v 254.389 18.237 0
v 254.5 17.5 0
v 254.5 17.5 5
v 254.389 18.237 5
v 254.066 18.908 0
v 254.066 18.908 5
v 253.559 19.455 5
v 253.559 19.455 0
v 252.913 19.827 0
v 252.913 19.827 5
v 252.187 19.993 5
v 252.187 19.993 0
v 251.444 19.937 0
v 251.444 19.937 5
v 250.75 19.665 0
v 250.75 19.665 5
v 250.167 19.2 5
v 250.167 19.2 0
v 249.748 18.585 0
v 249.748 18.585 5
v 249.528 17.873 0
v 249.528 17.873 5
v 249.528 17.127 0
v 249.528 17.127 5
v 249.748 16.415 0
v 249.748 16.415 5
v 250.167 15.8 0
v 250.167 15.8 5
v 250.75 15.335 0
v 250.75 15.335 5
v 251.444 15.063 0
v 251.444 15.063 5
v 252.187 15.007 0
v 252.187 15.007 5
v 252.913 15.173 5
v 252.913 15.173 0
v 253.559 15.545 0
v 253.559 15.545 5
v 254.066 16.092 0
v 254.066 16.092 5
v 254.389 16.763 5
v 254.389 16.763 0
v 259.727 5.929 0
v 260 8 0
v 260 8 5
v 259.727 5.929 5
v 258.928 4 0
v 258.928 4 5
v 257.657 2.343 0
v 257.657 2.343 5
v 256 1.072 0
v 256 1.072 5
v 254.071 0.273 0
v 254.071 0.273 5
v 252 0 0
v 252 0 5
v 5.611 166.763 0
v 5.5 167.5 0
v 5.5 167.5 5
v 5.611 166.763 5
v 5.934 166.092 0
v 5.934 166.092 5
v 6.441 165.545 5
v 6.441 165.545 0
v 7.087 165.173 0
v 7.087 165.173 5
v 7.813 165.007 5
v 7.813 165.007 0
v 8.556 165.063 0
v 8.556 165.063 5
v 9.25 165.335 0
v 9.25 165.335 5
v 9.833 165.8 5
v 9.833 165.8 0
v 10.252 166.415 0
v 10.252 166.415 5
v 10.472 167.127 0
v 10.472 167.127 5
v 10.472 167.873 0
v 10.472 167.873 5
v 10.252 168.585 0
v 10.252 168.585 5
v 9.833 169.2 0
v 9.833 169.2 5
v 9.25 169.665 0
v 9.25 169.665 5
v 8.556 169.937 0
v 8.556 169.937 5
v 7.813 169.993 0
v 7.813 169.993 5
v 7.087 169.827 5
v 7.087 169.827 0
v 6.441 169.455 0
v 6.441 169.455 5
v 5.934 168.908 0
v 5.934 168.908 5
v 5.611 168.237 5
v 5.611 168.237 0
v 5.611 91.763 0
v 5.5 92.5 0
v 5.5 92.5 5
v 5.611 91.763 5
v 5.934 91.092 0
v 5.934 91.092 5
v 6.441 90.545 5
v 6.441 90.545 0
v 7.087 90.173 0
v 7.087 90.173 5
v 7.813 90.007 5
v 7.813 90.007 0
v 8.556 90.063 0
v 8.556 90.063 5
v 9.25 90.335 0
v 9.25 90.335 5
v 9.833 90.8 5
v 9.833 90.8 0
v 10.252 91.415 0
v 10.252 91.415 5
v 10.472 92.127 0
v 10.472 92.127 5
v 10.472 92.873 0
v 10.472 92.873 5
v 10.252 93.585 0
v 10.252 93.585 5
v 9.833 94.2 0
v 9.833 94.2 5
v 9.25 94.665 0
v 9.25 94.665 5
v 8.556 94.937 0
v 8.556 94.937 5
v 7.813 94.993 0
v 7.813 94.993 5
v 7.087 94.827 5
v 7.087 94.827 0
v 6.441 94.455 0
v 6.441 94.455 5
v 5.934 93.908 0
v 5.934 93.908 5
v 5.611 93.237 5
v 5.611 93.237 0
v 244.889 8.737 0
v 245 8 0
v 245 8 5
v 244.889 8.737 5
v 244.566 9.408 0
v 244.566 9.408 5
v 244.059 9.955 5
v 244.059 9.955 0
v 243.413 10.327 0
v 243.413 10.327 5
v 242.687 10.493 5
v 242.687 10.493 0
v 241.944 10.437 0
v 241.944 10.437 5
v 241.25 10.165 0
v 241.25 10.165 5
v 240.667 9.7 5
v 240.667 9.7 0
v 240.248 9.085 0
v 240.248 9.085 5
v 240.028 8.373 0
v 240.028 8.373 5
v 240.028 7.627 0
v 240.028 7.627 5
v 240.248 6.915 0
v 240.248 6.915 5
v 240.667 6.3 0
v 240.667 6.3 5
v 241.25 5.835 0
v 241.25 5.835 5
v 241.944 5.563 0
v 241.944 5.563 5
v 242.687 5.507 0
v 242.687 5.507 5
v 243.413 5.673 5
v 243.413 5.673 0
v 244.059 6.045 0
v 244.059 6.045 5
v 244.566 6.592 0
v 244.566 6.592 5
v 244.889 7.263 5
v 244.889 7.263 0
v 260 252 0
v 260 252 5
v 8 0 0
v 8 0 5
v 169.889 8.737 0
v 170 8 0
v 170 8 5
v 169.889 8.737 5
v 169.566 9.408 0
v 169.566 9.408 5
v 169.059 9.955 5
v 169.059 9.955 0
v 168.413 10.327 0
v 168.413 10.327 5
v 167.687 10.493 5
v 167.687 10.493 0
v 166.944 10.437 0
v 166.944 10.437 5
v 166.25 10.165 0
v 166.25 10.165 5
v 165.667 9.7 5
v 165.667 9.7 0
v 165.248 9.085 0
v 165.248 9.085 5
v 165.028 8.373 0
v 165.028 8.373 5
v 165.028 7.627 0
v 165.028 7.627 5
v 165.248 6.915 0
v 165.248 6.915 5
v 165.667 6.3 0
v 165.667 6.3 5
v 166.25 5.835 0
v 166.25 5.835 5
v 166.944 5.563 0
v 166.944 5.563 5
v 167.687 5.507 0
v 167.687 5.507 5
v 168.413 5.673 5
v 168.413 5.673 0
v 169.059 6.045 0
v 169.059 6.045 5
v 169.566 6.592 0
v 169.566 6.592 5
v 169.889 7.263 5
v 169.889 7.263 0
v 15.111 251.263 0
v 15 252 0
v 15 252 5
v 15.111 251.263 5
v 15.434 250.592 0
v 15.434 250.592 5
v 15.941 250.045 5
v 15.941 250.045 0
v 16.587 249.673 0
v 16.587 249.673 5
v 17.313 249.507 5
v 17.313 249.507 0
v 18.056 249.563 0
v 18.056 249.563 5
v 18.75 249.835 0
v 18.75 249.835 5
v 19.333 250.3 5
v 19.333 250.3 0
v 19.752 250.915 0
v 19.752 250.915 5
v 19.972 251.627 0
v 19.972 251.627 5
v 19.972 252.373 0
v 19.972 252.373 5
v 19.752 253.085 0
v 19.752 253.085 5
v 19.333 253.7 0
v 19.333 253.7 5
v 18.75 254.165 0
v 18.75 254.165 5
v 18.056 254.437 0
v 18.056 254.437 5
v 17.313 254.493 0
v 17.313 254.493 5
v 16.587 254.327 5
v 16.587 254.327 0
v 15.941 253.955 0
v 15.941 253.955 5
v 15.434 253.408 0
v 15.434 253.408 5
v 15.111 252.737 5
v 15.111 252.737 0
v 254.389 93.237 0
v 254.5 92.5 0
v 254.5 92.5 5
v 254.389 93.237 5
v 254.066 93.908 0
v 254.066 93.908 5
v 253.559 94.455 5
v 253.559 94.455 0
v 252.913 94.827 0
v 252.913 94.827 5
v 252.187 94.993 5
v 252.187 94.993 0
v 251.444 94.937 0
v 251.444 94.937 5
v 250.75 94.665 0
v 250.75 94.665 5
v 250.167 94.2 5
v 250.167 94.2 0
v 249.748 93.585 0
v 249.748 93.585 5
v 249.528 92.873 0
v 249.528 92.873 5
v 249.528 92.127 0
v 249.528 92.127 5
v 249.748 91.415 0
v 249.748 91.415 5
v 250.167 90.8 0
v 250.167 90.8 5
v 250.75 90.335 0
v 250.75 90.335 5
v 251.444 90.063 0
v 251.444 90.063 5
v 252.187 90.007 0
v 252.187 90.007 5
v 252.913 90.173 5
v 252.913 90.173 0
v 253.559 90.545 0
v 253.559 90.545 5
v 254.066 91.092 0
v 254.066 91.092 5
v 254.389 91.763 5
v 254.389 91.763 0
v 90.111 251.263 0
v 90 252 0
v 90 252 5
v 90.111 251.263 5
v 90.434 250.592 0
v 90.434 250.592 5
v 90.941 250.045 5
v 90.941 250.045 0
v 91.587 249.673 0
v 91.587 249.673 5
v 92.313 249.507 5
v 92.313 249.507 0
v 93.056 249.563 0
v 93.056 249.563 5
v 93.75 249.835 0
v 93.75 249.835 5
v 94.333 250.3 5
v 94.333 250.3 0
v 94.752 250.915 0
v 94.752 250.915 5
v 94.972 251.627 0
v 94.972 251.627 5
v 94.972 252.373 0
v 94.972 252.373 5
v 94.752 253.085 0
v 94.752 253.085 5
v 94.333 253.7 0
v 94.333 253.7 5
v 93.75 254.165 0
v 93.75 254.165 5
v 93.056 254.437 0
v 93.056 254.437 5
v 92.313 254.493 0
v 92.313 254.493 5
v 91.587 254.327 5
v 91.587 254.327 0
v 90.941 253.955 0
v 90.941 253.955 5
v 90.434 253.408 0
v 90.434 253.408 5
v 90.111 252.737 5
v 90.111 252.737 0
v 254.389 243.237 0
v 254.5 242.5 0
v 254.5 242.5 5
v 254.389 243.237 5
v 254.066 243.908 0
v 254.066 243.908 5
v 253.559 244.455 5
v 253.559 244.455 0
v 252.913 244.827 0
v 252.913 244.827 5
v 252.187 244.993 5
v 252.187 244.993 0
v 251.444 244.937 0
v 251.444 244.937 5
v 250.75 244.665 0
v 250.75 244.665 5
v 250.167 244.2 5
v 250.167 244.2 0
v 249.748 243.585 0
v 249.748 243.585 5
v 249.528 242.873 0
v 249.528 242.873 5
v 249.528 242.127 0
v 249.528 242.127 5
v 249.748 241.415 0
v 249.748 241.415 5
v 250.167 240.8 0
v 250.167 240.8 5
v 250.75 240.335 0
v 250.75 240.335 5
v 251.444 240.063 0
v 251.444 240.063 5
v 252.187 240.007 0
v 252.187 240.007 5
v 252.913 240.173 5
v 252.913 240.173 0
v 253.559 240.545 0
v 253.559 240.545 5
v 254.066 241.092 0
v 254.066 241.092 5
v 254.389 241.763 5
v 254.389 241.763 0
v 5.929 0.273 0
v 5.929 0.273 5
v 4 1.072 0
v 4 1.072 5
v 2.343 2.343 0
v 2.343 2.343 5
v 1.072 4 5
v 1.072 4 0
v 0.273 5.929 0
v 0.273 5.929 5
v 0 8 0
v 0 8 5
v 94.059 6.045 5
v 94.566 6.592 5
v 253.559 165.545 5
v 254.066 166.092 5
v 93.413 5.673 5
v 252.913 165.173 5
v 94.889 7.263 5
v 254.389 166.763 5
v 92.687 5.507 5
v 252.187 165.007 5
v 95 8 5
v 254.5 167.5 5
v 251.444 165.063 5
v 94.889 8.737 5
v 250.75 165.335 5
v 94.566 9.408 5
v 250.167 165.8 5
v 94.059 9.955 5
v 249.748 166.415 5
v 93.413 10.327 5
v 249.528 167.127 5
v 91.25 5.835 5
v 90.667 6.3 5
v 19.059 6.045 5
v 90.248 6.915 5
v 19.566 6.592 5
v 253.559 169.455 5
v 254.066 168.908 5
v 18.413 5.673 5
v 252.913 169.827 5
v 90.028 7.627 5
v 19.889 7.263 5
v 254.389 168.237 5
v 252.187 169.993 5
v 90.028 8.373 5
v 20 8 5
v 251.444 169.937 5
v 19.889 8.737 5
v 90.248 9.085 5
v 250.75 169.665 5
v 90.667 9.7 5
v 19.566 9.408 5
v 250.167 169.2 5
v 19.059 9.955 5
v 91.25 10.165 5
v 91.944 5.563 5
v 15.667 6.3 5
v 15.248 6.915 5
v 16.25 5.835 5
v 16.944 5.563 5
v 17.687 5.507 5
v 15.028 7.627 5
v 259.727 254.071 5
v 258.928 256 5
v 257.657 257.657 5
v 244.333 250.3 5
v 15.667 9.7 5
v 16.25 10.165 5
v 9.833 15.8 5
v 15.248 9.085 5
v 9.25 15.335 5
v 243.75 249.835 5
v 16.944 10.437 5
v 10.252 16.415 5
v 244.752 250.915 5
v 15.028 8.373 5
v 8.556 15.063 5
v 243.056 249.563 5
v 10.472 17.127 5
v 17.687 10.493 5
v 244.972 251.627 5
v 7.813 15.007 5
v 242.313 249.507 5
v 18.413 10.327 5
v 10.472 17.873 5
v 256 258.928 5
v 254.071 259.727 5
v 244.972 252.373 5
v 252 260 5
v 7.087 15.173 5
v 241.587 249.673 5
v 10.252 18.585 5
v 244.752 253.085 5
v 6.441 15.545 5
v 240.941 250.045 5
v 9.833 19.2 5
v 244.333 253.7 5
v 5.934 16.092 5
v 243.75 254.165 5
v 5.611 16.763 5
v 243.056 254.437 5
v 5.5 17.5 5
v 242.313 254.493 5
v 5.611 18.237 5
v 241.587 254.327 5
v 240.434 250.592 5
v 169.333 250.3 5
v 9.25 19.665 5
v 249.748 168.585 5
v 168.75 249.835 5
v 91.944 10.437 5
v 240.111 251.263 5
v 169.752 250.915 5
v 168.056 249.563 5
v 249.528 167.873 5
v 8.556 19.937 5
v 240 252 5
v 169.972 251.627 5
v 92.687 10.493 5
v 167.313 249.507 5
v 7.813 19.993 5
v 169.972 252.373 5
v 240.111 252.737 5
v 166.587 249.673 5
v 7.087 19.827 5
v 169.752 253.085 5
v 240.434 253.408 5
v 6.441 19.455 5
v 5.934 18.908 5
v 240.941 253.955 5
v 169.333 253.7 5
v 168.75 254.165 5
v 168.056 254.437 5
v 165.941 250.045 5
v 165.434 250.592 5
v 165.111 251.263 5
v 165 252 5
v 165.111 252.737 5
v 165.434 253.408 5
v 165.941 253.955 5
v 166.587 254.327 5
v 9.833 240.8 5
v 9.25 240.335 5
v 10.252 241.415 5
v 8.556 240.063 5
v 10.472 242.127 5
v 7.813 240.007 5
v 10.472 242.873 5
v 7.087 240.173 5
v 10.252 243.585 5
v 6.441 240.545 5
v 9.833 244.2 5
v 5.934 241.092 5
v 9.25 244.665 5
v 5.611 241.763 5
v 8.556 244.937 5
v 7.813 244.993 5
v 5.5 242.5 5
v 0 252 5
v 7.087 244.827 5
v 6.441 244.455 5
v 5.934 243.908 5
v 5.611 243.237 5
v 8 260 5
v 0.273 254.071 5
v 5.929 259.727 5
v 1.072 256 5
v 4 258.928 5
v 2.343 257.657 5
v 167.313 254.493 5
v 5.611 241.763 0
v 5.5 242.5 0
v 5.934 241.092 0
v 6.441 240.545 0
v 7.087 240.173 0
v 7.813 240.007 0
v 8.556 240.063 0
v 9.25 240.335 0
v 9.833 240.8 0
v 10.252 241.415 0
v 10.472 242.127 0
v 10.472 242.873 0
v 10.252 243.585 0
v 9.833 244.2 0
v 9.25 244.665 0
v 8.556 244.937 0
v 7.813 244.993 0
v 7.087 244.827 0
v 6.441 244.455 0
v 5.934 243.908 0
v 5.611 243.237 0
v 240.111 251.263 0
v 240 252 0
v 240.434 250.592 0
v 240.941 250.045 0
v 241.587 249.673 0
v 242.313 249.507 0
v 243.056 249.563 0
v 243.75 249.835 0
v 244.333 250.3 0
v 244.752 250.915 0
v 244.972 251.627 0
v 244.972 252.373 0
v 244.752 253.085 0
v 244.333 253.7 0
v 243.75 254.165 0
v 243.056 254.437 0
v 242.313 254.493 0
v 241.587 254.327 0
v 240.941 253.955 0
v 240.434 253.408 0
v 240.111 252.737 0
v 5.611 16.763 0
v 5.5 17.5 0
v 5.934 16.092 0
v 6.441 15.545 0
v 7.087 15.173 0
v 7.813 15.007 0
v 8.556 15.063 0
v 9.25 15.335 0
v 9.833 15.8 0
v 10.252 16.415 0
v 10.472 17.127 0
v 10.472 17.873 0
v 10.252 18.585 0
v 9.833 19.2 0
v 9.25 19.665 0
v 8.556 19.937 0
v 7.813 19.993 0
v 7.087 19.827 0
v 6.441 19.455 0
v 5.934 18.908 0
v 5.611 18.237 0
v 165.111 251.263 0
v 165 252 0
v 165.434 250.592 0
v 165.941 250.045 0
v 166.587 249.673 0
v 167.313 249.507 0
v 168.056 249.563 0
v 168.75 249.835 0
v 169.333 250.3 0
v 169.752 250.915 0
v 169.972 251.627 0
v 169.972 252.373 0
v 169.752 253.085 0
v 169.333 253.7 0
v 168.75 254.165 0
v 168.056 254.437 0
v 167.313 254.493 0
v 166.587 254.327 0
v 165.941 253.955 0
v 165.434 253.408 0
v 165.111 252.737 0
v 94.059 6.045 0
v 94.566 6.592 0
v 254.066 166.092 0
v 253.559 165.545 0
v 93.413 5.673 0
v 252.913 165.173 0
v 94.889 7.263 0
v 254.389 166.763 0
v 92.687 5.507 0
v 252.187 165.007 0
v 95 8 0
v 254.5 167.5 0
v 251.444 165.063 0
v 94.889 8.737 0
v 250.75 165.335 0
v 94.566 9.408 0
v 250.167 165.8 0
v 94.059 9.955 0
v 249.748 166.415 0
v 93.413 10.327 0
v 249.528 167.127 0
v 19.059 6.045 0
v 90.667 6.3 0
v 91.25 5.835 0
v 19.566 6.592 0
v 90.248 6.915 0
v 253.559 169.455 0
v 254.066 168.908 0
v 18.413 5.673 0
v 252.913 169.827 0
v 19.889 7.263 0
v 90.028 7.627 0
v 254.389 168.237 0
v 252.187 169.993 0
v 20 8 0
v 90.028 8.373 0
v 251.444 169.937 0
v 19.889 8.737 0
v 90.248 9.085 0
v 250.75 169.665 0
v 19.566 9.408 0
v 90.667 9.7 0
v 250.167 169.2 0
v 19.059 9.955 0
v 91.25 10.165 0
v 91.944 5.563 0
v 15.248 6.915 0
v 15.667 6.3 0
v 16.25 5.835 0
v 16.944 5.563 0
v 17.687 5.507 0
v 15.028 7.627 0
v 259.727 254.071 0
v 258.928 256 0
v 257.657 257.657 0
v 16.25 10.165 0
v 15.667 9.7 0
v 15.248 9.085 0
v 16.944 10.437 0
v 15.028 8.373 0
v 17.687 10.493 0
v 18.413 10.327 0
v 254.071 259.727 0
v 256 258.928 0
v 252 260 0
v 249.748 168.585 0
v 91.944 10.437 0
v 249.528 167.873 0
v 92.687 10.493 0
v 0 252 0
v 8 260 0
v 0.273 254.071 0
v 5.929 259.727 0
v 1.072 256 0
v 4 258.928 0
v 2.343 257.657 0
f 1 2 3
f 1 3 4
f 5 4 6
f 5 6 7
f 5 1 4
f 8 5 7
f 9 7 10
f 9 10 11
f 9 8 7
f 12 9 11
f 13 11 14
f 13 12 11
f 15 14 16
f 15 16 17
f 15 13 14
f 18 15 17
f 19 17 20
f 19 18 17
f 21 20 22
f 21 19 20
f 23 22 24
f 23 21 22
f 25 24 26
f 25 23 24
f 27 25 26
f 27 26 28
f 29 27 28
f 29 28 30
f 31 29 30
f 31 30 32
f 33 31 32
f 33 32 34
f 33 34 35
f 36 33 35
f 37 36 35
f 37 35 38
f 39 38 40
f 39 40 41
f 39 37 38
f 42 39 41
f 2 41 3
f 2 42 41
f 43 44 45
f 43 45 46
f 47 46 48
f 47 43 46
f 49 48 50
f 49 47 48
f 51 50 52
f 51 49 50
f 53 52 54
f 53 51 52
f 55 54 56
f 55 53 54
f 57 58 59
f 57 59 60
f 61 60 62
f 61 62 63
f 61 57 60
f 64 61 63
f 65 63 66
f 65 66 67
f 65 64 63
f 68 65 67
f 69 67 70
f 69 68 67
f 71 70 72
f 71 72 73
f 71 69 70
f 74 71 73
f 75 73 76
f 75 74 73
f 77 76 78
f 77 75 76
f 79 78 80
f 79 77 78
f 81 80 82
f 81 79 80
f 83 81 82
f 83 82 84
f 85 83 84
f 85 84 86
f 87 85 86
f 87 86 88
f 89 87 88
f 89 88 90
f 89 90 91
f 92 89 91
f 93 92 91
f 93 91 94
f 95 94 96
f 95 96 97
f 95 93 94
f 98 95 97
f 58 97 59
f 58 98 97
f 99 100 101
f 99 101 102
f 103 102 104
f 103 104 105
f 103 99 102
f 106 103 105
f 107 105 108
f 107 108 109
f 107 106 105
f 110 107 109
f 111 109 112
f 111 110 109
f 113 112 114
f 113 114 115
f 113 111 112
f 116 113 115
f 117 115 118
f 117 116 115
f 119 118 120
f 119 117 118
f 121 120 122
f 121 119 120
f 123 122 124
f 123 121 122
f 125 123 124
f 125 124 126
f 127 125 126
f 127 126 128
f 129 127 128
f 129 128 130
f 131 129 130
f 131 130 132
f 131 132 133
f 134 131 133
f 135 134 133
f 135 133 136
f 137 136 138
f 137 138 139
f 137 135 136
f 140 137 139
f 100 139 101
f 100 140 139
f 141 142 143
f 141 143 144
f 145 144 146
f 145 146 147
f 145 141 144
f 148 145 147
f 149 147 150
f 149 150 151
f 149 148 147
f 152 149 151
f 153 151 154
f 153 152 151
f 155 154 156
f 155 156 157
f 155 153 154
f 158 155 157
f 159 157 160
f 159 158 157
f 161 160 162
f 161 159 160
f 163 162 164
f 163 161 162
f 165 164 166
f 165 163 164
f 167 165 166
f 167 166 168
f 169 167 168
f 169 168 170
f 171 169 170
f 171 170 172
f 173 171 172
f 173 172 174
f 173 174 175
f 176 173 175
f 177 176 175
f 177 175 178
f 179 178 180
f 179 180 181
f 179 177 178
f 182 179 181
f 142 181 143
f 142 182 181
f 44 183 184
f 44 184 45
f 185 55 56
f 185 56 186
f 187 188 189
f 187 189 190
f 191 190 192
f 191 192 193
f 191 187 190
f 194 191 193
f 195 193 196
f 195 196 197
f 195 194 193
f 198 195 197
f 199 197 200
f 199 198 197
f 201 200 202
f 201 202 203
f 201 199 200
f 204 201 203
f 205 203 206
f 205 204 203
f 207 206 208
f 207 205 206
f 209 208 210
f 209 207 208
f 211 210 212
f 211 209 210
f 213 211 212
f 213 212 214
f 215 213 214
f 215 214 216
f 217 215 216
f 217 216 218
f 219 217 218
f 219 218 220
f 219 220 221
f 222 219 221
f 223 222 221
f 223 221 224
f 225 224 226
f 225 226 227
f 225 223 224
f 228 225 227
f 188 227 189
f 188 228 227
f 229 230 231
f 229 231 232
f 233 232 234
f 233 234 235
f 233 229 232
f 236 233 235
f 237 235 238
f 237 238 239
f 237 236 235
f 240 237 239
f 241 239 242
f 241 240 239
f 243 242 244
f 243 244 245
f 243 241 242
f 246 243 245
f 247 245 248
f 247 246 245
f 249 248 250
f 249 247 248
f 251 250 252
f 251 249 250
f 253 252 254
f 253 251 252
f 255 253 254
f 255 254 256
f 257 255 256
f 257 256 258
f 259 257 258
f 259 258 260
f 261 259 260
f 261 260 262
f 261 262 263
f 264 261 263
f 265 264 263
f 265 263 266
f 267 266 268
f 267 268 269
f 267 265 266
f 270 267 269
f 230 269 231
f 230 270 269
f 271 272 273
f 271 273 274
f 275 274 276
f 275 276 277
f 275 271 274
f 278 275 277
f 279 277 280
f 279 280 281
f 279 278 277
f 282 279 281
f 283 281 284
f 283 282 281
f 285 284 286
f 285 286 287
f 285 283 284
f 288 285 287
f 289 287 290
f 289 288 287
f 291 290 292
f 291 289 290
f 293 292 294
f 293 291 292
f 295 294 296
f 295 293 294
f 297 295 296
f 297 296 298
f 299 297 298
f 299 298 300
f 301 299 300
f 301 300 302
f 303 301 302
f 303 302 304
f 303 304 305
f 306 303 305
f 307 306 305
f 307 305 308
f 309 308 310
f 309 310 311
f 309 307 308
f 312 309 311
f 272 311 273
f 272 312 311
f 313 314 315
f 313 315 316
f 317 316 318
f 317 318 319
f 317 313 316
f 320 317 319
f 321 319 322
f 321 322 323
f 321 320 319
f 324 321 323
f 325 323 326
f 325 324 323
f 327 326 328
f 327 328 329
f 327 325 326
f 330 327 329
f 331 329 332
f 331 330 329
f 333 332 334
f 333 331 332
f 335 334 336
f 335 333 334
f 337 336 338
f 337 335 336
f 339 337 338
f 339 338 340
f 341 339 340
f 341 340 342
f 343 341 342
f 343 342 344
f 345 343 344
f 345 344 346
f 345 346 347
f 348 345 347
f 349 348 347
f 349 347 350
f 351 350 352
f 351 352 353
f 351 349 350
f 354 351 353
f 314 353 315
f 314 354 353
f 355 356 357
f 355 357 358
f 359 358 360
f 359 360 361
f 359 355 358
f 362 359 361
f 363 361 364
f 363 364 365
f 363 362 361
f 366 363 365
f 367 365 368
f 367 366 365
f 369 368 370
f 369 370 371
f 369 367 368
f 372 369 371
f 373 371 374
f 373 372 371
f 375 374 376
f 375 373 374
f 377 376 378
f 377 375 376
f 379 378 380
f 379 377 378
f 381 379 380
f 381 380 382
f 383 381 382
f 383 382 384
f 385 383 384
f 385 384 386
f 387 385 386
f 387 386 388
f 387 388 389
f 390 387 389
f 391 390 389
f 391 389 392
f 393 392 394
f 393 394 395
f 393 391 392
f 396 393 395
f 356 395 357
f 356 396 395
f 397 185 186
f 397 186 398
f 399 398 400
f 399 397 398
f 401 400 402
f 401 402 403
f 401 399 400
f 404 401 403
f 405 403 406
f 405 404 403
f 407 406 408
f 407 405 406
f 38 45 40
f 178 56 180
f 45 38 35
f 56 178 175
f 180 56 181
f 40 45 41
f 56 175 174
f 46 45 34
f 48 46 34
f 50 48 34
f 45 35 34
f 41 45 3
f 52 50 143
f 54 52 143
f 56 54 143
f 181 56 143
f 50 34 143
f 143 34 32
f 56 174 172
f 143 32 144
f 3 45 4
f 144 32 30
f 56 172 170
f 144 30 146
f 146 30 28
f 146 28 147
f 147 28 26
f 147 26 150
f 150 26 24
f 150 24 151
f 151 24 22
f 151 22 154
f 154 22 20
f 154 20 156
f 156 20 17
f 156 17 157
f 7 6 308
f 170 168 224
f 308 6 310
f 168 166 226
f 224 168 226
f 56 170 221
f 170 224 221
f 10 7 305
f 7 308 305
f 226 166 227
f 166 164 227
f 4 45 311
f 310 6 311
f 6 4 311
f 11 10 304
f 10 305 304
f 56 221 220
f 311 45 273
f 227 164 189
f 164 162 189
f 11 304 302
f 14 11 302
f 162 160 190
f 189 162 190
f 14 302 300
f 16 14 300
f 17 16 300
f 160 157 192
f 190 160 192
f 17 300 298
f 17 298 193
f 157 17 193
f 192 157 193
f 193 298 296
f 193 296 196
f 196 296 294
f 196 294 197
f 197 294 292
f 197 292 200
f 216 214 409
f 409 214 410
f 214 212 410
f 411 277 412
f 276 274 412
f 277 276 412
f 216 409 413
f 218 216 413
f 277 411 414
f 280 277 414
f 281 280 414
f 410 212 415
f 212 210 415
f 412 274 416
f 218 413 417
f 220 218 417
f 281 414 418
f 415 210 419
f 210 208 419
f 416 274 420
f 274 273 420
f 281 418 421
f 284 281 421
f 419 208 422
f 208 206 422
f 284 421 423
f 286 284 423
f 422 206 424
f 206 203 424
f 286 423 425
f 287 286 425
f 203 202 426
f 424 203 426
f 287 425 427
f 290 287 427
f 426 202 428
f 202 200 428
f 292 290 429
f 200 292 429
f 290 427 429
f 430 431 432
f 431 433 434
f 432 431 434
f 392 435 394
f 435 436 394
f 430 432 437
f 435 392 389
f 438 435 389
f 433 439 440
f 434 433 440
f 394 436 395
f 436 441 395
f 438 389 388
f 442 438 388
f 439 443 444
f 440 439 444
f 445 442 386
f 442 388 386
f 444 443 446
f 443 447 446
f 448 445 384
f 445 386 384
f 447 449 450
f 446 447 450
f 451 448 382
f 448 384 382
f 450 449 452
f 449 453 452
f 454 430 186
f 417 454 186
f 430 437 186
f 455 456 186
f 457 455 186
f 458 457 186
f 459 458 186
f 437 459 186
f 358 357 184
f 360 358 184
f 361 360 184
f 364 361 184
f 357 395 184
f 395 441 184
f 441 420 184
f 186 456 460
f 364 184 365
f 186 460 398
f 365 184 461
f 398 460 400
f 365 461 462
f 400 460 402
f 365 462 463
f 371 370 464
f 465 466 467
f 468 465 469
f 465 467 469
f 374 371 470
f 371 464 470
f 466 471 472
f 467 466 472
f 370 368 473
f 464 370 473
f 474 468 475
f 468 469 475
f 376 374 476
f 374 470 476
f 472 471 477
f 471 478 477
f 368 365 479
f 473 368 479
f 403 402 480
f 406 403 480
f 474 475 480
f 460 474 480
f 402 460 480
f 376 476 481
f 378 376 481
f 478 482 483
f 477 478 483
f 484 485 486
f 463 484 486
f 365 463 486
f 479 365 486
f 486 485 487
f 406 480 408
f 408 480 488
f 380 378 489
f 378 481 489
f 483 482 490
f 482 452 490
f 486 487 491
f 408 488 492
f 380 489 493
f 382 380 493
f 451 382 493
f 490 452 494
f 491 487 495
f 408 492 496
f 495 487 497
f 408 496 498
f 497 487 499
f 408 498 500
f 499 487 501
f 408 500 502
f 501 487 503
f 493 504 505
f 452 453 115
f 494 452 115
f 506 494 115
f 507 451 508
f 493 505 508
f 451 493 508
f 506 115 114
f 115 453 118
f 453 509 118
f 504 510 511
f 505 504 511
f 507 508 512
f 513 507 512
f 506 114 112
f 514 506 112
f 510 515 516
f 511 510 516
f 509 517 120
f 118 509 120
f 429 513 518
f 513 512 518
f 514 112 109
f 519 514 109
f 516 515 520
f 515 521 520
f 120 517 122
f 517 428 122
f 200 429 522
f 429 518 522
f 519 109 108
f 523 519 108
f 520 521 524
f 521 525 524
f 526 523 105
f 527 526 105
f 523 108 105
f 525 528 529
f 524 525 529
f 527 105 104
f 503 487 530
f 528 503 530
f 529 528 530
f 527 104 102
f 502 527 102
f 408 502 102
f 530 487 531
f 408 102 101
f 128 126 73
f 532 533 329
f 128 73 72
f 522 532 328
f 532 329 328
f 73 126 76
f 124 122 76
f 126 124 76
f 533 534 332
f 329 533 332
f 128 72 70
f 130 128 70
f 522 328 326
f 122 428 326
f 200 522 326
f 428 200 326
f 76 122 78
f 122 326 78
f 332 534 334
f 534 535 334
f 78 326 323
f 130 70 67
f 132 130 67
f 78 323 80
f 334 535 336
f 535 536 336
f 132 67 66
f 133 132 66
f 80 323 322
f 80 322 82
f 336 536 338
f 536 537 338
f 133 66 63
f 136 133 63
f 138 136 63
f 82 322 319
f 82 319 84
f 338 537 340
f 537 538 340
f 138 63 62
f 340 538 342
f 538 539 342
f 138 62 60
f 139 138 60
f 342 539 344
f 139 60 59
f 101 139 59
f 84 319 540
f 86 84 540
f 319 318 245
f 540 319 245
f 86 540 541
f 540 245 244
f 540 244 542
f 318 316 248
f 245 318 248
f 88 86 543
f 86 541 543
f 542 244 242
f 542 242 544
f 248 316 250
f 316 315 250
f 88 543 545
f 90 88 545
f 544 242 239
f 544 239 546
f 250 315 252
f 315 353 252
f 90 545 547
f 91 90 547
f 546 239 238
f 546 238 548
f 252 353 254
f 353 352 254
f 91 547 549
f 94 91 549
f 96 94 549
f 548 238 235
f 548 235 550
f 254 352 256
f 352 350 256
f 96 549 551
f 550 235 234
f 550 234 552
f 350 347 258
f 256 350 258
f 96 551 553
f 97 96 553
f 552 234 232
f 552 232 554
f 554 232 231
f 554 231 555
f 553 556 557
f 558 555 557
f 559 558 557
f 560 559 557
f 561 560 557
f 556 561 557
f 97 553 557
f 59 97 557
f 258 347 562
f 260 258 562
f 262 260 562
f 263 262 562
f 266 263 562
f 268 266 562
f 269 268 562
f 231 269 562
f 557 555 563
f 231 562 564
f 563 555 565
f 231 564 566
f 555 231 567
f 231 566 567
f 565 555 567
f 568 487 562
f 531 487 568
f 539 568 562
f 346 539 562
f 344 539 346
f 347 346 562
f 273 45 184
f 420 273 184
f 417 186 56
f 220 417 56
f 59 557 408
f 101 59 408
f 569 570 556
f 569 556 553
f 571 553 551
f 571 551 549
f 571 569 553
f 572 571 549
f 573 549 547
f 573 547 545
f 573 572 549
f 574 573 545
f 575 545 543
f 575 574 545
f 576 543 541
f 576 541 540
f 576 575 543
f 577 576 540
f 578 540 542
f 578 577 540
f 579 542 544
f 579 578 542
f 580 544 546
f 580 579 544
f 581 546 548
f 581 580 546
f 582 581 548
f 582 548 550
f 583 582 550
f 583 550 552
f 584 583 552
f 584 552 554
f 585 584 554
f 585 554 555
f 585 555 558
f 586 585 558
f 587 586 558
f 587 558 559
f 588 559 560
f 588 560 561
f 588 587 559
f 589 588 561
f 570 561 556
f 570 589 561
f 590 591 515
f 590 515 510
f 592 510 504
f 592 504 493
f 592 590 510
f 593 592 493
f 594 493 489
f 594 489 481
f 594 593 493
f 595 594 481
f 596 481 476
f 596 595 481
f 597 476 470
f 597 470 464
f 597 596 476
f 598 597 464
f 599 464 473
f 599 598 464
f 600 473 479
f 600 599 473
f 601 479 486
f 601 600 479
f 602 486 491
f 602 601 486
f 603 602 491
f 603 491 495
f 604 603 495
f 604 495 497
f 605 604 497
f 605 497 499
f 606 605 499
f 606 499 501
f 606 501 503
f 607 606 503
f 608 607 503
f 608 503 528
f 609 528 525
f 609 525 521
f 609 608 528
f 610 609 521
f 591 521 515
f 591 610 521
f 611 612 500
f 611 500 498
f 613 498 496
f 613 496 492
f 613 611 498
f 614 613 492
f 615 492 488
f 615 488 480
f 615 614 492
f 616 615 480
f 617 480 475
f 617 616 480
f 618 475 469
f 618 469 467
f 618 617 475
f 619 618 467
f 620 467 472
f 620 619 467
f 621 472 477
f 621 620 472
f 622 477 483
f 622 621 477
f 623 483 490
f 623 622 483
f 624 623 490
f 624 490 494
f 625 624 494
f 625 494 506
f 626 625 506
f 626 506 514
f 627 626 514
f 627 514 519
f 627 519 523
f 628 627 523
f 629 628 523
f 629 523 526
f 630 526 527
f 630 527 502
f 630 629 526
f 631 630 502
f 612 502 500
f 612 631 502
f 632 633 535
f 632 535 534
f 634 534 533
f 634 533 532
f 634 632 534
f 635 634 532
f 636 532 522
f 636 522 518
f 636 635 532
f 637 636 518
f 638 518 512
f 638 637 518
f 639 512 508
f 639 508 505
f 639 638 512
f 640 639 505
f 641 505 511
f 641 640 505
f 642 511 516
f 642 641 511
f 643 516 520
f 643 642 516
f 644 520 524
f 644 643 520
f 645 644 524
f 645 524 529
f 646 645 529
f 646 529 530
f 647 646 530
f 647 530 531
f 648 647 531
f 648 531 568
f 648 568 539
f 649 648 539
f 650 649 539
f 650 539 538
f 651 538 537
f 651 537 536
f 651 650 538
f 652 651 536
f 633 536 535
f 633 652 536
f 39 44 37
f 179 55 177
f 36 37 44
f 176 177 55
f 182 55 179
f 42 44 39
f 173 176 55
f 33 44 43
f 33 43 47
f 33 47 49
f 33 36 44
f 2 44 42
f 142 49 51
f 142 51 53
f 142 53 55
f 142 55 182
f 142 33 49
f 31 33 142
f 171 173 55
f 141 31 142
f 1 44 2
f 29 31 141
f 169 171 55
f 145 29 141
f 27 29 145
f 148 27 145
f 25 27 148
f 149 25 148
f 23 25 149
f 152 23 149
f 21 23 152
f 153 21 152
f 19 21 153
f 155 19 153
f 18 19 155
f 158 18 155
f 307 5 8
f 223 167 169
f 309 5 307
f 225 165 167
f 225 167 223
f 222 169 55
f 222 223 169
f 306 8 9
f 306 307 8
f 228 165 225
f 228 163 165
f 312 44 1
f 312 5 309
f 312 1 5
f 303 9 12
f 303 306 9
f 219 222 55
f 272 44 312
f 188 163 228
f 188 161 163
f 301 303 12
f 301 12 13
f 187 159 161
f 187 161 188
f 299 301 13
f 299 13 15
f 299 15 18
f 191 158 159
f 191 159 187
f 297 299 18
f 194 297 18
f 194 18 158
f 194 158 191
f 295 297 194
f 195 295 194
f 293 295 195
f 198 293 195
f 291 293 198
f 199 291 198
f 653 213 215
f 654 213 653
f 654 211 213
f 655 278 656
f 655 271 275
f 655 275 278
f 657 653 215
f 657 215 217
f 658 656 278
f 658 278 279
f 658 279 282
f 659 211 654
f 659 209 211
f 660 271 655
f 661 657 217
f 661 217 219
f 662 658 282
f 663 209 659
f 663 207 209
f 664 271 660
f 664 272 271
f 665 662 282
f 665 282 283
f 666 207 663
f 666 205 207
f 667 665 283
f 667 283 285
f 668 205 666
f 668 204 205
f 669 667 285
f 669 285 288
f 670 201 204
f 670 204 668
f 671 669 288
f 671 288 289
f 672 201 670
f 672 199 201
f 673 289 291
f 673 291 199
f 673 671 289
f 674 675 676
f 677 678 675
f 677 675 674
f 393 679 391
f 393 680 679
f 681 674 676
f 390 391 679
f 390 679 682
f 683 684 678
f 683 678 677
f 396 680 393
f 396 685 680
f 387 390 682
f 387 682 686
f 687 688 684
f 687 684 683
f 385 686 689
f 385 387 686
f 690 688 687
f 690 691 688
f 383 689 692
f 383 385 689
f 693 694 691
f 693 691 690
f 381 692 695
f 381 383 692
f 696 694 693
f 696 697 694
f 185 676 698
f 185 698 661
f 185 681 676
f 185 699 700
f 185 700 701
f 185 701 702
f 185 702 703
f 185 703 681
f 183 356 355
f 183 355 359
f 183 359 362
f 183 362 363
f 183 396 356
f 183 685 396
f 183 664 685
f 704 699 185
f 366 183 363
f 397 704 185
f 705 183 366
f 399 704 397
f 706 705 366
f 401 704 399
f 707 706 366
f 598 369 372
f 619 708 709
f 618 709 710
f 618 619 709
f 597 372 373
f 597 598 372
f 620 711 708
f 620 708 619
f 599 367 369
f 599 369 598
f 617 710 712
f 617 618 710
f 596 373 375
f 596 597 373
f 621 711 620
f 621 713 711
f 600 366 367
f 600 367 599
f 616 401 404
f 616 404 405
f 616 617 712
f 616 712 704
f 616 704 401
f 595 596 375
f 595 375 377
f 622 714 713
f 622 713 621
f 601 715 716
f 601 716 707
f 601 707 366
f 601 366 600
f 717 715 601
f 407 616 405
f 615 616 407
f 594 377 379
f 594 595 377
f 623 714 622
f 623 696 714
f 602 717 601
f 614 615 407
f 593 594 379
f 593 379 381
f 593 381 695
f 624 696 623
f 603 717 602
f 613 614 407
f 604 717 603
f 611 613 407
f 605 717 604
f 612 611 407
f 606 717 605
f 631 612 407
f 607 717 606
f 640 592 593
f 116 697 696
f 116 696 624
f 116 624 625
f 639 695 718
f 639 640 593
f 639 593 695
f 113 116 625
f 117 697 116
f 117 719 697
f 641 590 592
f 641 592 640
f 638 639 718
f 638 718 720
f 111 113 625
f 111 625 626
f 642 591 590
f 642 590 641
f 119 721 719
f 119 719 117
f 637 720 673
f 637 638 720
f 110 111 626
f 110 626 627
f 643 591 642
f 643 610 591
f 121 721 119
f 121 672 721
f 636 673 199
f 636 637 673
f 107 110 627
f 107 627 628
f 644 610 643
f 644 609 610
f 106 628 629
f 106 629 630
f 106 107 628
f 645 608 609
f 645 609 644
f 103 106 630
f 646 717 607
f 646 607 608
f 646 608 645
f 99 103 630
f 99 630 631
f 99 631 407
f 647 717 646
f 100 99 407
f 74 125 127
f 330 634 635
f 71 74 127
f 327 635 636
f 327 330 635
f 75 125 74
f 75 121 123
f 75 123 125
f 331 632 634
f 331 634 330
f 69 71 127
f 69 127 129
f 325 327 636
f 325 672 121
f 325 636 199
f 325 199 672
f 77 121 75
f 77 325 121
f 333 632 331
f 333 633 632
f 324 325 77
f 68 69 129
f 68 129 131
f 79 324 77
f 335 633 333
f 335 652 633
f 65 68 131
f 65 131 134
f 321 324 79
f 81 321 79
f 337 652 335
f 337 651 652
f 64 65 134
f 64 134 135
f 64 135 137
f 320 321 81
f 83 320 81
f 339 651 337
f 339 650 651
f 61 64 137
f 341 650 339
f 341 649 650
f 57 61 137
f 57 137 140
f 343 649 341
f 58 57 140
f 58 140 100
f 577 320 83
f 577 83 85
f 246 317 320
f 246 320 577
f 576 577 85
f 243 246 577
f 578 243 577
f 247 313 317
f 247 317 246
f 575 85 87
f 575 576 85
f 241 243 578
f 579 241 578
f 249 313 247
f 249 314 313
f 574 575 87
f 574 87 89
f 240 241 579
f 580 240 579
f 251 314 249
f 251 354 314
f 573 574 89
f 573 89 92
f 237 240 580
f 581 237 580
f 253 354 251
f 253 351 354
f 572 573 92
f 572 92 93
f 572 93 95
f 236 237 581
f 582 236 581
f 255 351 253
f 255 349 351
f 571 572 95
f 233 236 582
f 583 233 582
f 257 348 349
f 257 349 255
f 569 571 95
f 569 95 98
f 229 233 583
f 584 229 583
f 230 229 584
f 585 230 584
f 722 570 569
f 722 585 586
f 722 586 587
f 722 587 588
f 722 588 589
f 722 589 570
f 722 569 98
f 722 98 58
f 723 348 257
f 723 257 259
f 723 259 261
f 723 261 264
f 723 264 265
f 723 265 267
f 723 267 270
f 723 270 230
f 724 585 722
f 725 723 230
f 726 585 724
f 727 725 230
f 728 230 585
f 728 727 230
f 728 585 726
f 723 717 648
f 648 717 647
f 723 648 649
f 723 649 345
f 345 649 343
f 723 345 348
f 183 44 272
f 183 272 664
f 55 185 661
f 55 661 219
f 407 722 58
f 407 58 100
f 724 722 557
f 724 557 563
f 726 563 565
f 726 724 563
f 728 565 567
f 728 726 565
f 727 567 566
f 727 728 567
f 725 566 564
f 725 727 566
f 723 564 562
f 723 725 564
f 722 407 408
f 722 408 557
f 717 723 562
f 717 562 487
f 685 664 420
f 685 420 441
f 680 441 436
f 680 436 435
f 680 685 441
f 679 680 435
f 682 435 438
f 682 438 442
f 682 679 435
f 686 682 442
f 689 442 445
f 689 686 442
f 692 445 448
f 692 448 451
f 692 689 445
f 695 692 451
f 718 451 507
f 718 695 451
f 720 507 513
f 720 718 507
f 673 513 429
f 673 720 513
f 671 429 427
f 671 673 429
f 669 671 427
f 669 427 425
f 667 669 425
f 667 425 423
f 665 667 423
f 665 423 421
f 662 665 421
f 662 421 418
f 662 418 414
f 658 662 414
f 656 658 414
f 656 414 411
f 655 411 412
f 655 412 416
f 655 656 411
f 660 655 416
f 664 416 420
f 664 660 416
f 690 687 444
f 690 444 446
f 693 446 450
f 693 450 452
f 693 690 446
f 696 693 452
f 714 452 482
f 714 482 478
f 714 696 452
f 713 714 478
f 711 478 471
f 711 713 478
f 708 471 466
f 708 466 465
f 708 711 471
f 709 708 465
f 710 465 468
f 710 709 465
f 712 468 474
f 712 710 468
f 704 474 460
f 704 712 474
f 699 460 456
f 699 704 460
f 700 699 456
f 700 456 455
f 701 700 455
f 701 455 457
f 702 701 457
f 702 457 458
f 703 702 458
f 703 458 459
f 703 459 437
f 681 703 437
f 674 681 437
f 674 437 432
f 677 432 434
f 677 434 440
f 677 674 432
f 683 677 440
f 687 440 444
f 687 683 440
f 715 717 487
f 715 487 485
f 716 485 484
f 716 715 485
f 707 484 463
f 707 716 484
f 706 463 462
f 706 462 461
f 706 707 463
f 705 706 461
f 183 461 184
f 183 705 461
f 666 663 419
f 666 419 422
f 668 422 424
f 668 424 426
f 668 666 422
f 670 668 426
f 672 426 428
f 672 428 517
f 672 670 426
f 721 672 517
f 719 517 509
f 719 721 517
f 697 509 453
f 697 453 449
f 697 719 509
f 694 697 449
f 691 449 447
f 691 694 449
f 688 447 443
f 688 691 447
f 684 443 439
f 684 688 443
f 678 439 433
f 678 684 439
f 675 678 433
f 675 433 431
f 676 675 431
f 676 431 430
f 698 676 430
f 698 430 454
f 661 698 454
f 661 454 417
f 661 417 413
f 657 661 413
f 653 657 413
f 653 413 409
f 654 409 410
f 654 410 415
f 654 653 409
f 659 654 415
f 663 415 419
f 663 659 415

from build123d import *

# Parameters (mm, degrees)
SKETCH_1_R      = 2.5
EXTRUDE_4_DEPTH = 5


with BuildPart() as part:
    # 草图1 → 凸台-拉伸4 (new body)
    with BuildSketch(Plane.XY):
        with BuildLine():
            Line((8, 260), (252, 260))
            ThreePointArc((252, 260), (257.656854249, 257.656854249), (260, 252))
            Line((260, 252), (260, 8))
            ThreePointArc((260, 8), (257.656854249, 2.343145751), (252, 0))
            Line((252, 0), (8, 0))
            ThreePointArc((8, 0), (2.343145751, 2.343145751), (0, 8))
            Line((0, 8), (0, 252))
            ThreePointArc((0, 252), (2.343145751, 257.656854249), (8, 260))
        make_face()
        with Locations((17.5, 8)):
            Circle(SKETCH_1_R, mode=Mode.SUBTRACT)
        with Locations((92.5, 8)):
            Circle(SKETCH_1_R, mode=Mode.SUBTRACT)
        with Locations((167.5, 8)):
            Circle(SKETCH_1_R, mode=Mode.SUBTRACT)
        with Locations((242.5, 8)):
            Circle(SKETCH_1_R, mode=Mode.SUBTRACT)
        with Locations((252, 242.5)):
            Circle(SKETCH_1_R, mode=Mode.SUBTRACT)
        with Locations((252, 167.5)):
            Circle(SKETCH_1_R, mode=Mode.SUBTRACT)
        with Locations((252, 92.5)):
            Circle(SKETCH_1_R, mode=Mode.SUBTRACT)
        with Locations((252, 17.5)):
            Circle(SKETCH_1_R, mode=Mode.SUBTRACT)
        with Locations(Location((242.5, 252, 0), (0, 0, 180))):
            Circle(SKETCH_1_R, mode=Mode.SUBTRACT)
        with Locations(Location((167.5, 252, 0), (0, 0, 180))):
            Circle(SKETCH_1_R, mode=Mode.SUBTRACT)
        with Locations(Location((92.5, 252, 0), (0, 0, 180))):
            Circle(SKETCH_1_R, mode=Mode.SUBTRACT)
        with Locations(Location((17.5, 252, 0), (0, 0, 180))):
            Circle(SKETCH_1_R, mode=Mode.SUBTRACT)
        with Locations(Location((8, 17.5, 0), (0, 0, 180))):
            Circle(SKETCH_1_R, mode=Mode.SUBTRACT)
        with Locations(Location((8, 92.5, 0), (0, 0, 180))):
            Circle(SKETCH_1_R, mode=Mode.SUBTRACT)
        with Locations(Location((8, 167.5, 0), (0, 0, 180))):
            Circle(SKETCH_1_R, mode=Mode.SUBTRACT)
        with Locations(Location((8, 242.5, 0), (0, 0, 180))):
            Circle(SKETCH_1_R, mode=Mode.SUBTRACT)
    extrude(amount=EXTRUDE_4_DEPTH)


solid = part.part
